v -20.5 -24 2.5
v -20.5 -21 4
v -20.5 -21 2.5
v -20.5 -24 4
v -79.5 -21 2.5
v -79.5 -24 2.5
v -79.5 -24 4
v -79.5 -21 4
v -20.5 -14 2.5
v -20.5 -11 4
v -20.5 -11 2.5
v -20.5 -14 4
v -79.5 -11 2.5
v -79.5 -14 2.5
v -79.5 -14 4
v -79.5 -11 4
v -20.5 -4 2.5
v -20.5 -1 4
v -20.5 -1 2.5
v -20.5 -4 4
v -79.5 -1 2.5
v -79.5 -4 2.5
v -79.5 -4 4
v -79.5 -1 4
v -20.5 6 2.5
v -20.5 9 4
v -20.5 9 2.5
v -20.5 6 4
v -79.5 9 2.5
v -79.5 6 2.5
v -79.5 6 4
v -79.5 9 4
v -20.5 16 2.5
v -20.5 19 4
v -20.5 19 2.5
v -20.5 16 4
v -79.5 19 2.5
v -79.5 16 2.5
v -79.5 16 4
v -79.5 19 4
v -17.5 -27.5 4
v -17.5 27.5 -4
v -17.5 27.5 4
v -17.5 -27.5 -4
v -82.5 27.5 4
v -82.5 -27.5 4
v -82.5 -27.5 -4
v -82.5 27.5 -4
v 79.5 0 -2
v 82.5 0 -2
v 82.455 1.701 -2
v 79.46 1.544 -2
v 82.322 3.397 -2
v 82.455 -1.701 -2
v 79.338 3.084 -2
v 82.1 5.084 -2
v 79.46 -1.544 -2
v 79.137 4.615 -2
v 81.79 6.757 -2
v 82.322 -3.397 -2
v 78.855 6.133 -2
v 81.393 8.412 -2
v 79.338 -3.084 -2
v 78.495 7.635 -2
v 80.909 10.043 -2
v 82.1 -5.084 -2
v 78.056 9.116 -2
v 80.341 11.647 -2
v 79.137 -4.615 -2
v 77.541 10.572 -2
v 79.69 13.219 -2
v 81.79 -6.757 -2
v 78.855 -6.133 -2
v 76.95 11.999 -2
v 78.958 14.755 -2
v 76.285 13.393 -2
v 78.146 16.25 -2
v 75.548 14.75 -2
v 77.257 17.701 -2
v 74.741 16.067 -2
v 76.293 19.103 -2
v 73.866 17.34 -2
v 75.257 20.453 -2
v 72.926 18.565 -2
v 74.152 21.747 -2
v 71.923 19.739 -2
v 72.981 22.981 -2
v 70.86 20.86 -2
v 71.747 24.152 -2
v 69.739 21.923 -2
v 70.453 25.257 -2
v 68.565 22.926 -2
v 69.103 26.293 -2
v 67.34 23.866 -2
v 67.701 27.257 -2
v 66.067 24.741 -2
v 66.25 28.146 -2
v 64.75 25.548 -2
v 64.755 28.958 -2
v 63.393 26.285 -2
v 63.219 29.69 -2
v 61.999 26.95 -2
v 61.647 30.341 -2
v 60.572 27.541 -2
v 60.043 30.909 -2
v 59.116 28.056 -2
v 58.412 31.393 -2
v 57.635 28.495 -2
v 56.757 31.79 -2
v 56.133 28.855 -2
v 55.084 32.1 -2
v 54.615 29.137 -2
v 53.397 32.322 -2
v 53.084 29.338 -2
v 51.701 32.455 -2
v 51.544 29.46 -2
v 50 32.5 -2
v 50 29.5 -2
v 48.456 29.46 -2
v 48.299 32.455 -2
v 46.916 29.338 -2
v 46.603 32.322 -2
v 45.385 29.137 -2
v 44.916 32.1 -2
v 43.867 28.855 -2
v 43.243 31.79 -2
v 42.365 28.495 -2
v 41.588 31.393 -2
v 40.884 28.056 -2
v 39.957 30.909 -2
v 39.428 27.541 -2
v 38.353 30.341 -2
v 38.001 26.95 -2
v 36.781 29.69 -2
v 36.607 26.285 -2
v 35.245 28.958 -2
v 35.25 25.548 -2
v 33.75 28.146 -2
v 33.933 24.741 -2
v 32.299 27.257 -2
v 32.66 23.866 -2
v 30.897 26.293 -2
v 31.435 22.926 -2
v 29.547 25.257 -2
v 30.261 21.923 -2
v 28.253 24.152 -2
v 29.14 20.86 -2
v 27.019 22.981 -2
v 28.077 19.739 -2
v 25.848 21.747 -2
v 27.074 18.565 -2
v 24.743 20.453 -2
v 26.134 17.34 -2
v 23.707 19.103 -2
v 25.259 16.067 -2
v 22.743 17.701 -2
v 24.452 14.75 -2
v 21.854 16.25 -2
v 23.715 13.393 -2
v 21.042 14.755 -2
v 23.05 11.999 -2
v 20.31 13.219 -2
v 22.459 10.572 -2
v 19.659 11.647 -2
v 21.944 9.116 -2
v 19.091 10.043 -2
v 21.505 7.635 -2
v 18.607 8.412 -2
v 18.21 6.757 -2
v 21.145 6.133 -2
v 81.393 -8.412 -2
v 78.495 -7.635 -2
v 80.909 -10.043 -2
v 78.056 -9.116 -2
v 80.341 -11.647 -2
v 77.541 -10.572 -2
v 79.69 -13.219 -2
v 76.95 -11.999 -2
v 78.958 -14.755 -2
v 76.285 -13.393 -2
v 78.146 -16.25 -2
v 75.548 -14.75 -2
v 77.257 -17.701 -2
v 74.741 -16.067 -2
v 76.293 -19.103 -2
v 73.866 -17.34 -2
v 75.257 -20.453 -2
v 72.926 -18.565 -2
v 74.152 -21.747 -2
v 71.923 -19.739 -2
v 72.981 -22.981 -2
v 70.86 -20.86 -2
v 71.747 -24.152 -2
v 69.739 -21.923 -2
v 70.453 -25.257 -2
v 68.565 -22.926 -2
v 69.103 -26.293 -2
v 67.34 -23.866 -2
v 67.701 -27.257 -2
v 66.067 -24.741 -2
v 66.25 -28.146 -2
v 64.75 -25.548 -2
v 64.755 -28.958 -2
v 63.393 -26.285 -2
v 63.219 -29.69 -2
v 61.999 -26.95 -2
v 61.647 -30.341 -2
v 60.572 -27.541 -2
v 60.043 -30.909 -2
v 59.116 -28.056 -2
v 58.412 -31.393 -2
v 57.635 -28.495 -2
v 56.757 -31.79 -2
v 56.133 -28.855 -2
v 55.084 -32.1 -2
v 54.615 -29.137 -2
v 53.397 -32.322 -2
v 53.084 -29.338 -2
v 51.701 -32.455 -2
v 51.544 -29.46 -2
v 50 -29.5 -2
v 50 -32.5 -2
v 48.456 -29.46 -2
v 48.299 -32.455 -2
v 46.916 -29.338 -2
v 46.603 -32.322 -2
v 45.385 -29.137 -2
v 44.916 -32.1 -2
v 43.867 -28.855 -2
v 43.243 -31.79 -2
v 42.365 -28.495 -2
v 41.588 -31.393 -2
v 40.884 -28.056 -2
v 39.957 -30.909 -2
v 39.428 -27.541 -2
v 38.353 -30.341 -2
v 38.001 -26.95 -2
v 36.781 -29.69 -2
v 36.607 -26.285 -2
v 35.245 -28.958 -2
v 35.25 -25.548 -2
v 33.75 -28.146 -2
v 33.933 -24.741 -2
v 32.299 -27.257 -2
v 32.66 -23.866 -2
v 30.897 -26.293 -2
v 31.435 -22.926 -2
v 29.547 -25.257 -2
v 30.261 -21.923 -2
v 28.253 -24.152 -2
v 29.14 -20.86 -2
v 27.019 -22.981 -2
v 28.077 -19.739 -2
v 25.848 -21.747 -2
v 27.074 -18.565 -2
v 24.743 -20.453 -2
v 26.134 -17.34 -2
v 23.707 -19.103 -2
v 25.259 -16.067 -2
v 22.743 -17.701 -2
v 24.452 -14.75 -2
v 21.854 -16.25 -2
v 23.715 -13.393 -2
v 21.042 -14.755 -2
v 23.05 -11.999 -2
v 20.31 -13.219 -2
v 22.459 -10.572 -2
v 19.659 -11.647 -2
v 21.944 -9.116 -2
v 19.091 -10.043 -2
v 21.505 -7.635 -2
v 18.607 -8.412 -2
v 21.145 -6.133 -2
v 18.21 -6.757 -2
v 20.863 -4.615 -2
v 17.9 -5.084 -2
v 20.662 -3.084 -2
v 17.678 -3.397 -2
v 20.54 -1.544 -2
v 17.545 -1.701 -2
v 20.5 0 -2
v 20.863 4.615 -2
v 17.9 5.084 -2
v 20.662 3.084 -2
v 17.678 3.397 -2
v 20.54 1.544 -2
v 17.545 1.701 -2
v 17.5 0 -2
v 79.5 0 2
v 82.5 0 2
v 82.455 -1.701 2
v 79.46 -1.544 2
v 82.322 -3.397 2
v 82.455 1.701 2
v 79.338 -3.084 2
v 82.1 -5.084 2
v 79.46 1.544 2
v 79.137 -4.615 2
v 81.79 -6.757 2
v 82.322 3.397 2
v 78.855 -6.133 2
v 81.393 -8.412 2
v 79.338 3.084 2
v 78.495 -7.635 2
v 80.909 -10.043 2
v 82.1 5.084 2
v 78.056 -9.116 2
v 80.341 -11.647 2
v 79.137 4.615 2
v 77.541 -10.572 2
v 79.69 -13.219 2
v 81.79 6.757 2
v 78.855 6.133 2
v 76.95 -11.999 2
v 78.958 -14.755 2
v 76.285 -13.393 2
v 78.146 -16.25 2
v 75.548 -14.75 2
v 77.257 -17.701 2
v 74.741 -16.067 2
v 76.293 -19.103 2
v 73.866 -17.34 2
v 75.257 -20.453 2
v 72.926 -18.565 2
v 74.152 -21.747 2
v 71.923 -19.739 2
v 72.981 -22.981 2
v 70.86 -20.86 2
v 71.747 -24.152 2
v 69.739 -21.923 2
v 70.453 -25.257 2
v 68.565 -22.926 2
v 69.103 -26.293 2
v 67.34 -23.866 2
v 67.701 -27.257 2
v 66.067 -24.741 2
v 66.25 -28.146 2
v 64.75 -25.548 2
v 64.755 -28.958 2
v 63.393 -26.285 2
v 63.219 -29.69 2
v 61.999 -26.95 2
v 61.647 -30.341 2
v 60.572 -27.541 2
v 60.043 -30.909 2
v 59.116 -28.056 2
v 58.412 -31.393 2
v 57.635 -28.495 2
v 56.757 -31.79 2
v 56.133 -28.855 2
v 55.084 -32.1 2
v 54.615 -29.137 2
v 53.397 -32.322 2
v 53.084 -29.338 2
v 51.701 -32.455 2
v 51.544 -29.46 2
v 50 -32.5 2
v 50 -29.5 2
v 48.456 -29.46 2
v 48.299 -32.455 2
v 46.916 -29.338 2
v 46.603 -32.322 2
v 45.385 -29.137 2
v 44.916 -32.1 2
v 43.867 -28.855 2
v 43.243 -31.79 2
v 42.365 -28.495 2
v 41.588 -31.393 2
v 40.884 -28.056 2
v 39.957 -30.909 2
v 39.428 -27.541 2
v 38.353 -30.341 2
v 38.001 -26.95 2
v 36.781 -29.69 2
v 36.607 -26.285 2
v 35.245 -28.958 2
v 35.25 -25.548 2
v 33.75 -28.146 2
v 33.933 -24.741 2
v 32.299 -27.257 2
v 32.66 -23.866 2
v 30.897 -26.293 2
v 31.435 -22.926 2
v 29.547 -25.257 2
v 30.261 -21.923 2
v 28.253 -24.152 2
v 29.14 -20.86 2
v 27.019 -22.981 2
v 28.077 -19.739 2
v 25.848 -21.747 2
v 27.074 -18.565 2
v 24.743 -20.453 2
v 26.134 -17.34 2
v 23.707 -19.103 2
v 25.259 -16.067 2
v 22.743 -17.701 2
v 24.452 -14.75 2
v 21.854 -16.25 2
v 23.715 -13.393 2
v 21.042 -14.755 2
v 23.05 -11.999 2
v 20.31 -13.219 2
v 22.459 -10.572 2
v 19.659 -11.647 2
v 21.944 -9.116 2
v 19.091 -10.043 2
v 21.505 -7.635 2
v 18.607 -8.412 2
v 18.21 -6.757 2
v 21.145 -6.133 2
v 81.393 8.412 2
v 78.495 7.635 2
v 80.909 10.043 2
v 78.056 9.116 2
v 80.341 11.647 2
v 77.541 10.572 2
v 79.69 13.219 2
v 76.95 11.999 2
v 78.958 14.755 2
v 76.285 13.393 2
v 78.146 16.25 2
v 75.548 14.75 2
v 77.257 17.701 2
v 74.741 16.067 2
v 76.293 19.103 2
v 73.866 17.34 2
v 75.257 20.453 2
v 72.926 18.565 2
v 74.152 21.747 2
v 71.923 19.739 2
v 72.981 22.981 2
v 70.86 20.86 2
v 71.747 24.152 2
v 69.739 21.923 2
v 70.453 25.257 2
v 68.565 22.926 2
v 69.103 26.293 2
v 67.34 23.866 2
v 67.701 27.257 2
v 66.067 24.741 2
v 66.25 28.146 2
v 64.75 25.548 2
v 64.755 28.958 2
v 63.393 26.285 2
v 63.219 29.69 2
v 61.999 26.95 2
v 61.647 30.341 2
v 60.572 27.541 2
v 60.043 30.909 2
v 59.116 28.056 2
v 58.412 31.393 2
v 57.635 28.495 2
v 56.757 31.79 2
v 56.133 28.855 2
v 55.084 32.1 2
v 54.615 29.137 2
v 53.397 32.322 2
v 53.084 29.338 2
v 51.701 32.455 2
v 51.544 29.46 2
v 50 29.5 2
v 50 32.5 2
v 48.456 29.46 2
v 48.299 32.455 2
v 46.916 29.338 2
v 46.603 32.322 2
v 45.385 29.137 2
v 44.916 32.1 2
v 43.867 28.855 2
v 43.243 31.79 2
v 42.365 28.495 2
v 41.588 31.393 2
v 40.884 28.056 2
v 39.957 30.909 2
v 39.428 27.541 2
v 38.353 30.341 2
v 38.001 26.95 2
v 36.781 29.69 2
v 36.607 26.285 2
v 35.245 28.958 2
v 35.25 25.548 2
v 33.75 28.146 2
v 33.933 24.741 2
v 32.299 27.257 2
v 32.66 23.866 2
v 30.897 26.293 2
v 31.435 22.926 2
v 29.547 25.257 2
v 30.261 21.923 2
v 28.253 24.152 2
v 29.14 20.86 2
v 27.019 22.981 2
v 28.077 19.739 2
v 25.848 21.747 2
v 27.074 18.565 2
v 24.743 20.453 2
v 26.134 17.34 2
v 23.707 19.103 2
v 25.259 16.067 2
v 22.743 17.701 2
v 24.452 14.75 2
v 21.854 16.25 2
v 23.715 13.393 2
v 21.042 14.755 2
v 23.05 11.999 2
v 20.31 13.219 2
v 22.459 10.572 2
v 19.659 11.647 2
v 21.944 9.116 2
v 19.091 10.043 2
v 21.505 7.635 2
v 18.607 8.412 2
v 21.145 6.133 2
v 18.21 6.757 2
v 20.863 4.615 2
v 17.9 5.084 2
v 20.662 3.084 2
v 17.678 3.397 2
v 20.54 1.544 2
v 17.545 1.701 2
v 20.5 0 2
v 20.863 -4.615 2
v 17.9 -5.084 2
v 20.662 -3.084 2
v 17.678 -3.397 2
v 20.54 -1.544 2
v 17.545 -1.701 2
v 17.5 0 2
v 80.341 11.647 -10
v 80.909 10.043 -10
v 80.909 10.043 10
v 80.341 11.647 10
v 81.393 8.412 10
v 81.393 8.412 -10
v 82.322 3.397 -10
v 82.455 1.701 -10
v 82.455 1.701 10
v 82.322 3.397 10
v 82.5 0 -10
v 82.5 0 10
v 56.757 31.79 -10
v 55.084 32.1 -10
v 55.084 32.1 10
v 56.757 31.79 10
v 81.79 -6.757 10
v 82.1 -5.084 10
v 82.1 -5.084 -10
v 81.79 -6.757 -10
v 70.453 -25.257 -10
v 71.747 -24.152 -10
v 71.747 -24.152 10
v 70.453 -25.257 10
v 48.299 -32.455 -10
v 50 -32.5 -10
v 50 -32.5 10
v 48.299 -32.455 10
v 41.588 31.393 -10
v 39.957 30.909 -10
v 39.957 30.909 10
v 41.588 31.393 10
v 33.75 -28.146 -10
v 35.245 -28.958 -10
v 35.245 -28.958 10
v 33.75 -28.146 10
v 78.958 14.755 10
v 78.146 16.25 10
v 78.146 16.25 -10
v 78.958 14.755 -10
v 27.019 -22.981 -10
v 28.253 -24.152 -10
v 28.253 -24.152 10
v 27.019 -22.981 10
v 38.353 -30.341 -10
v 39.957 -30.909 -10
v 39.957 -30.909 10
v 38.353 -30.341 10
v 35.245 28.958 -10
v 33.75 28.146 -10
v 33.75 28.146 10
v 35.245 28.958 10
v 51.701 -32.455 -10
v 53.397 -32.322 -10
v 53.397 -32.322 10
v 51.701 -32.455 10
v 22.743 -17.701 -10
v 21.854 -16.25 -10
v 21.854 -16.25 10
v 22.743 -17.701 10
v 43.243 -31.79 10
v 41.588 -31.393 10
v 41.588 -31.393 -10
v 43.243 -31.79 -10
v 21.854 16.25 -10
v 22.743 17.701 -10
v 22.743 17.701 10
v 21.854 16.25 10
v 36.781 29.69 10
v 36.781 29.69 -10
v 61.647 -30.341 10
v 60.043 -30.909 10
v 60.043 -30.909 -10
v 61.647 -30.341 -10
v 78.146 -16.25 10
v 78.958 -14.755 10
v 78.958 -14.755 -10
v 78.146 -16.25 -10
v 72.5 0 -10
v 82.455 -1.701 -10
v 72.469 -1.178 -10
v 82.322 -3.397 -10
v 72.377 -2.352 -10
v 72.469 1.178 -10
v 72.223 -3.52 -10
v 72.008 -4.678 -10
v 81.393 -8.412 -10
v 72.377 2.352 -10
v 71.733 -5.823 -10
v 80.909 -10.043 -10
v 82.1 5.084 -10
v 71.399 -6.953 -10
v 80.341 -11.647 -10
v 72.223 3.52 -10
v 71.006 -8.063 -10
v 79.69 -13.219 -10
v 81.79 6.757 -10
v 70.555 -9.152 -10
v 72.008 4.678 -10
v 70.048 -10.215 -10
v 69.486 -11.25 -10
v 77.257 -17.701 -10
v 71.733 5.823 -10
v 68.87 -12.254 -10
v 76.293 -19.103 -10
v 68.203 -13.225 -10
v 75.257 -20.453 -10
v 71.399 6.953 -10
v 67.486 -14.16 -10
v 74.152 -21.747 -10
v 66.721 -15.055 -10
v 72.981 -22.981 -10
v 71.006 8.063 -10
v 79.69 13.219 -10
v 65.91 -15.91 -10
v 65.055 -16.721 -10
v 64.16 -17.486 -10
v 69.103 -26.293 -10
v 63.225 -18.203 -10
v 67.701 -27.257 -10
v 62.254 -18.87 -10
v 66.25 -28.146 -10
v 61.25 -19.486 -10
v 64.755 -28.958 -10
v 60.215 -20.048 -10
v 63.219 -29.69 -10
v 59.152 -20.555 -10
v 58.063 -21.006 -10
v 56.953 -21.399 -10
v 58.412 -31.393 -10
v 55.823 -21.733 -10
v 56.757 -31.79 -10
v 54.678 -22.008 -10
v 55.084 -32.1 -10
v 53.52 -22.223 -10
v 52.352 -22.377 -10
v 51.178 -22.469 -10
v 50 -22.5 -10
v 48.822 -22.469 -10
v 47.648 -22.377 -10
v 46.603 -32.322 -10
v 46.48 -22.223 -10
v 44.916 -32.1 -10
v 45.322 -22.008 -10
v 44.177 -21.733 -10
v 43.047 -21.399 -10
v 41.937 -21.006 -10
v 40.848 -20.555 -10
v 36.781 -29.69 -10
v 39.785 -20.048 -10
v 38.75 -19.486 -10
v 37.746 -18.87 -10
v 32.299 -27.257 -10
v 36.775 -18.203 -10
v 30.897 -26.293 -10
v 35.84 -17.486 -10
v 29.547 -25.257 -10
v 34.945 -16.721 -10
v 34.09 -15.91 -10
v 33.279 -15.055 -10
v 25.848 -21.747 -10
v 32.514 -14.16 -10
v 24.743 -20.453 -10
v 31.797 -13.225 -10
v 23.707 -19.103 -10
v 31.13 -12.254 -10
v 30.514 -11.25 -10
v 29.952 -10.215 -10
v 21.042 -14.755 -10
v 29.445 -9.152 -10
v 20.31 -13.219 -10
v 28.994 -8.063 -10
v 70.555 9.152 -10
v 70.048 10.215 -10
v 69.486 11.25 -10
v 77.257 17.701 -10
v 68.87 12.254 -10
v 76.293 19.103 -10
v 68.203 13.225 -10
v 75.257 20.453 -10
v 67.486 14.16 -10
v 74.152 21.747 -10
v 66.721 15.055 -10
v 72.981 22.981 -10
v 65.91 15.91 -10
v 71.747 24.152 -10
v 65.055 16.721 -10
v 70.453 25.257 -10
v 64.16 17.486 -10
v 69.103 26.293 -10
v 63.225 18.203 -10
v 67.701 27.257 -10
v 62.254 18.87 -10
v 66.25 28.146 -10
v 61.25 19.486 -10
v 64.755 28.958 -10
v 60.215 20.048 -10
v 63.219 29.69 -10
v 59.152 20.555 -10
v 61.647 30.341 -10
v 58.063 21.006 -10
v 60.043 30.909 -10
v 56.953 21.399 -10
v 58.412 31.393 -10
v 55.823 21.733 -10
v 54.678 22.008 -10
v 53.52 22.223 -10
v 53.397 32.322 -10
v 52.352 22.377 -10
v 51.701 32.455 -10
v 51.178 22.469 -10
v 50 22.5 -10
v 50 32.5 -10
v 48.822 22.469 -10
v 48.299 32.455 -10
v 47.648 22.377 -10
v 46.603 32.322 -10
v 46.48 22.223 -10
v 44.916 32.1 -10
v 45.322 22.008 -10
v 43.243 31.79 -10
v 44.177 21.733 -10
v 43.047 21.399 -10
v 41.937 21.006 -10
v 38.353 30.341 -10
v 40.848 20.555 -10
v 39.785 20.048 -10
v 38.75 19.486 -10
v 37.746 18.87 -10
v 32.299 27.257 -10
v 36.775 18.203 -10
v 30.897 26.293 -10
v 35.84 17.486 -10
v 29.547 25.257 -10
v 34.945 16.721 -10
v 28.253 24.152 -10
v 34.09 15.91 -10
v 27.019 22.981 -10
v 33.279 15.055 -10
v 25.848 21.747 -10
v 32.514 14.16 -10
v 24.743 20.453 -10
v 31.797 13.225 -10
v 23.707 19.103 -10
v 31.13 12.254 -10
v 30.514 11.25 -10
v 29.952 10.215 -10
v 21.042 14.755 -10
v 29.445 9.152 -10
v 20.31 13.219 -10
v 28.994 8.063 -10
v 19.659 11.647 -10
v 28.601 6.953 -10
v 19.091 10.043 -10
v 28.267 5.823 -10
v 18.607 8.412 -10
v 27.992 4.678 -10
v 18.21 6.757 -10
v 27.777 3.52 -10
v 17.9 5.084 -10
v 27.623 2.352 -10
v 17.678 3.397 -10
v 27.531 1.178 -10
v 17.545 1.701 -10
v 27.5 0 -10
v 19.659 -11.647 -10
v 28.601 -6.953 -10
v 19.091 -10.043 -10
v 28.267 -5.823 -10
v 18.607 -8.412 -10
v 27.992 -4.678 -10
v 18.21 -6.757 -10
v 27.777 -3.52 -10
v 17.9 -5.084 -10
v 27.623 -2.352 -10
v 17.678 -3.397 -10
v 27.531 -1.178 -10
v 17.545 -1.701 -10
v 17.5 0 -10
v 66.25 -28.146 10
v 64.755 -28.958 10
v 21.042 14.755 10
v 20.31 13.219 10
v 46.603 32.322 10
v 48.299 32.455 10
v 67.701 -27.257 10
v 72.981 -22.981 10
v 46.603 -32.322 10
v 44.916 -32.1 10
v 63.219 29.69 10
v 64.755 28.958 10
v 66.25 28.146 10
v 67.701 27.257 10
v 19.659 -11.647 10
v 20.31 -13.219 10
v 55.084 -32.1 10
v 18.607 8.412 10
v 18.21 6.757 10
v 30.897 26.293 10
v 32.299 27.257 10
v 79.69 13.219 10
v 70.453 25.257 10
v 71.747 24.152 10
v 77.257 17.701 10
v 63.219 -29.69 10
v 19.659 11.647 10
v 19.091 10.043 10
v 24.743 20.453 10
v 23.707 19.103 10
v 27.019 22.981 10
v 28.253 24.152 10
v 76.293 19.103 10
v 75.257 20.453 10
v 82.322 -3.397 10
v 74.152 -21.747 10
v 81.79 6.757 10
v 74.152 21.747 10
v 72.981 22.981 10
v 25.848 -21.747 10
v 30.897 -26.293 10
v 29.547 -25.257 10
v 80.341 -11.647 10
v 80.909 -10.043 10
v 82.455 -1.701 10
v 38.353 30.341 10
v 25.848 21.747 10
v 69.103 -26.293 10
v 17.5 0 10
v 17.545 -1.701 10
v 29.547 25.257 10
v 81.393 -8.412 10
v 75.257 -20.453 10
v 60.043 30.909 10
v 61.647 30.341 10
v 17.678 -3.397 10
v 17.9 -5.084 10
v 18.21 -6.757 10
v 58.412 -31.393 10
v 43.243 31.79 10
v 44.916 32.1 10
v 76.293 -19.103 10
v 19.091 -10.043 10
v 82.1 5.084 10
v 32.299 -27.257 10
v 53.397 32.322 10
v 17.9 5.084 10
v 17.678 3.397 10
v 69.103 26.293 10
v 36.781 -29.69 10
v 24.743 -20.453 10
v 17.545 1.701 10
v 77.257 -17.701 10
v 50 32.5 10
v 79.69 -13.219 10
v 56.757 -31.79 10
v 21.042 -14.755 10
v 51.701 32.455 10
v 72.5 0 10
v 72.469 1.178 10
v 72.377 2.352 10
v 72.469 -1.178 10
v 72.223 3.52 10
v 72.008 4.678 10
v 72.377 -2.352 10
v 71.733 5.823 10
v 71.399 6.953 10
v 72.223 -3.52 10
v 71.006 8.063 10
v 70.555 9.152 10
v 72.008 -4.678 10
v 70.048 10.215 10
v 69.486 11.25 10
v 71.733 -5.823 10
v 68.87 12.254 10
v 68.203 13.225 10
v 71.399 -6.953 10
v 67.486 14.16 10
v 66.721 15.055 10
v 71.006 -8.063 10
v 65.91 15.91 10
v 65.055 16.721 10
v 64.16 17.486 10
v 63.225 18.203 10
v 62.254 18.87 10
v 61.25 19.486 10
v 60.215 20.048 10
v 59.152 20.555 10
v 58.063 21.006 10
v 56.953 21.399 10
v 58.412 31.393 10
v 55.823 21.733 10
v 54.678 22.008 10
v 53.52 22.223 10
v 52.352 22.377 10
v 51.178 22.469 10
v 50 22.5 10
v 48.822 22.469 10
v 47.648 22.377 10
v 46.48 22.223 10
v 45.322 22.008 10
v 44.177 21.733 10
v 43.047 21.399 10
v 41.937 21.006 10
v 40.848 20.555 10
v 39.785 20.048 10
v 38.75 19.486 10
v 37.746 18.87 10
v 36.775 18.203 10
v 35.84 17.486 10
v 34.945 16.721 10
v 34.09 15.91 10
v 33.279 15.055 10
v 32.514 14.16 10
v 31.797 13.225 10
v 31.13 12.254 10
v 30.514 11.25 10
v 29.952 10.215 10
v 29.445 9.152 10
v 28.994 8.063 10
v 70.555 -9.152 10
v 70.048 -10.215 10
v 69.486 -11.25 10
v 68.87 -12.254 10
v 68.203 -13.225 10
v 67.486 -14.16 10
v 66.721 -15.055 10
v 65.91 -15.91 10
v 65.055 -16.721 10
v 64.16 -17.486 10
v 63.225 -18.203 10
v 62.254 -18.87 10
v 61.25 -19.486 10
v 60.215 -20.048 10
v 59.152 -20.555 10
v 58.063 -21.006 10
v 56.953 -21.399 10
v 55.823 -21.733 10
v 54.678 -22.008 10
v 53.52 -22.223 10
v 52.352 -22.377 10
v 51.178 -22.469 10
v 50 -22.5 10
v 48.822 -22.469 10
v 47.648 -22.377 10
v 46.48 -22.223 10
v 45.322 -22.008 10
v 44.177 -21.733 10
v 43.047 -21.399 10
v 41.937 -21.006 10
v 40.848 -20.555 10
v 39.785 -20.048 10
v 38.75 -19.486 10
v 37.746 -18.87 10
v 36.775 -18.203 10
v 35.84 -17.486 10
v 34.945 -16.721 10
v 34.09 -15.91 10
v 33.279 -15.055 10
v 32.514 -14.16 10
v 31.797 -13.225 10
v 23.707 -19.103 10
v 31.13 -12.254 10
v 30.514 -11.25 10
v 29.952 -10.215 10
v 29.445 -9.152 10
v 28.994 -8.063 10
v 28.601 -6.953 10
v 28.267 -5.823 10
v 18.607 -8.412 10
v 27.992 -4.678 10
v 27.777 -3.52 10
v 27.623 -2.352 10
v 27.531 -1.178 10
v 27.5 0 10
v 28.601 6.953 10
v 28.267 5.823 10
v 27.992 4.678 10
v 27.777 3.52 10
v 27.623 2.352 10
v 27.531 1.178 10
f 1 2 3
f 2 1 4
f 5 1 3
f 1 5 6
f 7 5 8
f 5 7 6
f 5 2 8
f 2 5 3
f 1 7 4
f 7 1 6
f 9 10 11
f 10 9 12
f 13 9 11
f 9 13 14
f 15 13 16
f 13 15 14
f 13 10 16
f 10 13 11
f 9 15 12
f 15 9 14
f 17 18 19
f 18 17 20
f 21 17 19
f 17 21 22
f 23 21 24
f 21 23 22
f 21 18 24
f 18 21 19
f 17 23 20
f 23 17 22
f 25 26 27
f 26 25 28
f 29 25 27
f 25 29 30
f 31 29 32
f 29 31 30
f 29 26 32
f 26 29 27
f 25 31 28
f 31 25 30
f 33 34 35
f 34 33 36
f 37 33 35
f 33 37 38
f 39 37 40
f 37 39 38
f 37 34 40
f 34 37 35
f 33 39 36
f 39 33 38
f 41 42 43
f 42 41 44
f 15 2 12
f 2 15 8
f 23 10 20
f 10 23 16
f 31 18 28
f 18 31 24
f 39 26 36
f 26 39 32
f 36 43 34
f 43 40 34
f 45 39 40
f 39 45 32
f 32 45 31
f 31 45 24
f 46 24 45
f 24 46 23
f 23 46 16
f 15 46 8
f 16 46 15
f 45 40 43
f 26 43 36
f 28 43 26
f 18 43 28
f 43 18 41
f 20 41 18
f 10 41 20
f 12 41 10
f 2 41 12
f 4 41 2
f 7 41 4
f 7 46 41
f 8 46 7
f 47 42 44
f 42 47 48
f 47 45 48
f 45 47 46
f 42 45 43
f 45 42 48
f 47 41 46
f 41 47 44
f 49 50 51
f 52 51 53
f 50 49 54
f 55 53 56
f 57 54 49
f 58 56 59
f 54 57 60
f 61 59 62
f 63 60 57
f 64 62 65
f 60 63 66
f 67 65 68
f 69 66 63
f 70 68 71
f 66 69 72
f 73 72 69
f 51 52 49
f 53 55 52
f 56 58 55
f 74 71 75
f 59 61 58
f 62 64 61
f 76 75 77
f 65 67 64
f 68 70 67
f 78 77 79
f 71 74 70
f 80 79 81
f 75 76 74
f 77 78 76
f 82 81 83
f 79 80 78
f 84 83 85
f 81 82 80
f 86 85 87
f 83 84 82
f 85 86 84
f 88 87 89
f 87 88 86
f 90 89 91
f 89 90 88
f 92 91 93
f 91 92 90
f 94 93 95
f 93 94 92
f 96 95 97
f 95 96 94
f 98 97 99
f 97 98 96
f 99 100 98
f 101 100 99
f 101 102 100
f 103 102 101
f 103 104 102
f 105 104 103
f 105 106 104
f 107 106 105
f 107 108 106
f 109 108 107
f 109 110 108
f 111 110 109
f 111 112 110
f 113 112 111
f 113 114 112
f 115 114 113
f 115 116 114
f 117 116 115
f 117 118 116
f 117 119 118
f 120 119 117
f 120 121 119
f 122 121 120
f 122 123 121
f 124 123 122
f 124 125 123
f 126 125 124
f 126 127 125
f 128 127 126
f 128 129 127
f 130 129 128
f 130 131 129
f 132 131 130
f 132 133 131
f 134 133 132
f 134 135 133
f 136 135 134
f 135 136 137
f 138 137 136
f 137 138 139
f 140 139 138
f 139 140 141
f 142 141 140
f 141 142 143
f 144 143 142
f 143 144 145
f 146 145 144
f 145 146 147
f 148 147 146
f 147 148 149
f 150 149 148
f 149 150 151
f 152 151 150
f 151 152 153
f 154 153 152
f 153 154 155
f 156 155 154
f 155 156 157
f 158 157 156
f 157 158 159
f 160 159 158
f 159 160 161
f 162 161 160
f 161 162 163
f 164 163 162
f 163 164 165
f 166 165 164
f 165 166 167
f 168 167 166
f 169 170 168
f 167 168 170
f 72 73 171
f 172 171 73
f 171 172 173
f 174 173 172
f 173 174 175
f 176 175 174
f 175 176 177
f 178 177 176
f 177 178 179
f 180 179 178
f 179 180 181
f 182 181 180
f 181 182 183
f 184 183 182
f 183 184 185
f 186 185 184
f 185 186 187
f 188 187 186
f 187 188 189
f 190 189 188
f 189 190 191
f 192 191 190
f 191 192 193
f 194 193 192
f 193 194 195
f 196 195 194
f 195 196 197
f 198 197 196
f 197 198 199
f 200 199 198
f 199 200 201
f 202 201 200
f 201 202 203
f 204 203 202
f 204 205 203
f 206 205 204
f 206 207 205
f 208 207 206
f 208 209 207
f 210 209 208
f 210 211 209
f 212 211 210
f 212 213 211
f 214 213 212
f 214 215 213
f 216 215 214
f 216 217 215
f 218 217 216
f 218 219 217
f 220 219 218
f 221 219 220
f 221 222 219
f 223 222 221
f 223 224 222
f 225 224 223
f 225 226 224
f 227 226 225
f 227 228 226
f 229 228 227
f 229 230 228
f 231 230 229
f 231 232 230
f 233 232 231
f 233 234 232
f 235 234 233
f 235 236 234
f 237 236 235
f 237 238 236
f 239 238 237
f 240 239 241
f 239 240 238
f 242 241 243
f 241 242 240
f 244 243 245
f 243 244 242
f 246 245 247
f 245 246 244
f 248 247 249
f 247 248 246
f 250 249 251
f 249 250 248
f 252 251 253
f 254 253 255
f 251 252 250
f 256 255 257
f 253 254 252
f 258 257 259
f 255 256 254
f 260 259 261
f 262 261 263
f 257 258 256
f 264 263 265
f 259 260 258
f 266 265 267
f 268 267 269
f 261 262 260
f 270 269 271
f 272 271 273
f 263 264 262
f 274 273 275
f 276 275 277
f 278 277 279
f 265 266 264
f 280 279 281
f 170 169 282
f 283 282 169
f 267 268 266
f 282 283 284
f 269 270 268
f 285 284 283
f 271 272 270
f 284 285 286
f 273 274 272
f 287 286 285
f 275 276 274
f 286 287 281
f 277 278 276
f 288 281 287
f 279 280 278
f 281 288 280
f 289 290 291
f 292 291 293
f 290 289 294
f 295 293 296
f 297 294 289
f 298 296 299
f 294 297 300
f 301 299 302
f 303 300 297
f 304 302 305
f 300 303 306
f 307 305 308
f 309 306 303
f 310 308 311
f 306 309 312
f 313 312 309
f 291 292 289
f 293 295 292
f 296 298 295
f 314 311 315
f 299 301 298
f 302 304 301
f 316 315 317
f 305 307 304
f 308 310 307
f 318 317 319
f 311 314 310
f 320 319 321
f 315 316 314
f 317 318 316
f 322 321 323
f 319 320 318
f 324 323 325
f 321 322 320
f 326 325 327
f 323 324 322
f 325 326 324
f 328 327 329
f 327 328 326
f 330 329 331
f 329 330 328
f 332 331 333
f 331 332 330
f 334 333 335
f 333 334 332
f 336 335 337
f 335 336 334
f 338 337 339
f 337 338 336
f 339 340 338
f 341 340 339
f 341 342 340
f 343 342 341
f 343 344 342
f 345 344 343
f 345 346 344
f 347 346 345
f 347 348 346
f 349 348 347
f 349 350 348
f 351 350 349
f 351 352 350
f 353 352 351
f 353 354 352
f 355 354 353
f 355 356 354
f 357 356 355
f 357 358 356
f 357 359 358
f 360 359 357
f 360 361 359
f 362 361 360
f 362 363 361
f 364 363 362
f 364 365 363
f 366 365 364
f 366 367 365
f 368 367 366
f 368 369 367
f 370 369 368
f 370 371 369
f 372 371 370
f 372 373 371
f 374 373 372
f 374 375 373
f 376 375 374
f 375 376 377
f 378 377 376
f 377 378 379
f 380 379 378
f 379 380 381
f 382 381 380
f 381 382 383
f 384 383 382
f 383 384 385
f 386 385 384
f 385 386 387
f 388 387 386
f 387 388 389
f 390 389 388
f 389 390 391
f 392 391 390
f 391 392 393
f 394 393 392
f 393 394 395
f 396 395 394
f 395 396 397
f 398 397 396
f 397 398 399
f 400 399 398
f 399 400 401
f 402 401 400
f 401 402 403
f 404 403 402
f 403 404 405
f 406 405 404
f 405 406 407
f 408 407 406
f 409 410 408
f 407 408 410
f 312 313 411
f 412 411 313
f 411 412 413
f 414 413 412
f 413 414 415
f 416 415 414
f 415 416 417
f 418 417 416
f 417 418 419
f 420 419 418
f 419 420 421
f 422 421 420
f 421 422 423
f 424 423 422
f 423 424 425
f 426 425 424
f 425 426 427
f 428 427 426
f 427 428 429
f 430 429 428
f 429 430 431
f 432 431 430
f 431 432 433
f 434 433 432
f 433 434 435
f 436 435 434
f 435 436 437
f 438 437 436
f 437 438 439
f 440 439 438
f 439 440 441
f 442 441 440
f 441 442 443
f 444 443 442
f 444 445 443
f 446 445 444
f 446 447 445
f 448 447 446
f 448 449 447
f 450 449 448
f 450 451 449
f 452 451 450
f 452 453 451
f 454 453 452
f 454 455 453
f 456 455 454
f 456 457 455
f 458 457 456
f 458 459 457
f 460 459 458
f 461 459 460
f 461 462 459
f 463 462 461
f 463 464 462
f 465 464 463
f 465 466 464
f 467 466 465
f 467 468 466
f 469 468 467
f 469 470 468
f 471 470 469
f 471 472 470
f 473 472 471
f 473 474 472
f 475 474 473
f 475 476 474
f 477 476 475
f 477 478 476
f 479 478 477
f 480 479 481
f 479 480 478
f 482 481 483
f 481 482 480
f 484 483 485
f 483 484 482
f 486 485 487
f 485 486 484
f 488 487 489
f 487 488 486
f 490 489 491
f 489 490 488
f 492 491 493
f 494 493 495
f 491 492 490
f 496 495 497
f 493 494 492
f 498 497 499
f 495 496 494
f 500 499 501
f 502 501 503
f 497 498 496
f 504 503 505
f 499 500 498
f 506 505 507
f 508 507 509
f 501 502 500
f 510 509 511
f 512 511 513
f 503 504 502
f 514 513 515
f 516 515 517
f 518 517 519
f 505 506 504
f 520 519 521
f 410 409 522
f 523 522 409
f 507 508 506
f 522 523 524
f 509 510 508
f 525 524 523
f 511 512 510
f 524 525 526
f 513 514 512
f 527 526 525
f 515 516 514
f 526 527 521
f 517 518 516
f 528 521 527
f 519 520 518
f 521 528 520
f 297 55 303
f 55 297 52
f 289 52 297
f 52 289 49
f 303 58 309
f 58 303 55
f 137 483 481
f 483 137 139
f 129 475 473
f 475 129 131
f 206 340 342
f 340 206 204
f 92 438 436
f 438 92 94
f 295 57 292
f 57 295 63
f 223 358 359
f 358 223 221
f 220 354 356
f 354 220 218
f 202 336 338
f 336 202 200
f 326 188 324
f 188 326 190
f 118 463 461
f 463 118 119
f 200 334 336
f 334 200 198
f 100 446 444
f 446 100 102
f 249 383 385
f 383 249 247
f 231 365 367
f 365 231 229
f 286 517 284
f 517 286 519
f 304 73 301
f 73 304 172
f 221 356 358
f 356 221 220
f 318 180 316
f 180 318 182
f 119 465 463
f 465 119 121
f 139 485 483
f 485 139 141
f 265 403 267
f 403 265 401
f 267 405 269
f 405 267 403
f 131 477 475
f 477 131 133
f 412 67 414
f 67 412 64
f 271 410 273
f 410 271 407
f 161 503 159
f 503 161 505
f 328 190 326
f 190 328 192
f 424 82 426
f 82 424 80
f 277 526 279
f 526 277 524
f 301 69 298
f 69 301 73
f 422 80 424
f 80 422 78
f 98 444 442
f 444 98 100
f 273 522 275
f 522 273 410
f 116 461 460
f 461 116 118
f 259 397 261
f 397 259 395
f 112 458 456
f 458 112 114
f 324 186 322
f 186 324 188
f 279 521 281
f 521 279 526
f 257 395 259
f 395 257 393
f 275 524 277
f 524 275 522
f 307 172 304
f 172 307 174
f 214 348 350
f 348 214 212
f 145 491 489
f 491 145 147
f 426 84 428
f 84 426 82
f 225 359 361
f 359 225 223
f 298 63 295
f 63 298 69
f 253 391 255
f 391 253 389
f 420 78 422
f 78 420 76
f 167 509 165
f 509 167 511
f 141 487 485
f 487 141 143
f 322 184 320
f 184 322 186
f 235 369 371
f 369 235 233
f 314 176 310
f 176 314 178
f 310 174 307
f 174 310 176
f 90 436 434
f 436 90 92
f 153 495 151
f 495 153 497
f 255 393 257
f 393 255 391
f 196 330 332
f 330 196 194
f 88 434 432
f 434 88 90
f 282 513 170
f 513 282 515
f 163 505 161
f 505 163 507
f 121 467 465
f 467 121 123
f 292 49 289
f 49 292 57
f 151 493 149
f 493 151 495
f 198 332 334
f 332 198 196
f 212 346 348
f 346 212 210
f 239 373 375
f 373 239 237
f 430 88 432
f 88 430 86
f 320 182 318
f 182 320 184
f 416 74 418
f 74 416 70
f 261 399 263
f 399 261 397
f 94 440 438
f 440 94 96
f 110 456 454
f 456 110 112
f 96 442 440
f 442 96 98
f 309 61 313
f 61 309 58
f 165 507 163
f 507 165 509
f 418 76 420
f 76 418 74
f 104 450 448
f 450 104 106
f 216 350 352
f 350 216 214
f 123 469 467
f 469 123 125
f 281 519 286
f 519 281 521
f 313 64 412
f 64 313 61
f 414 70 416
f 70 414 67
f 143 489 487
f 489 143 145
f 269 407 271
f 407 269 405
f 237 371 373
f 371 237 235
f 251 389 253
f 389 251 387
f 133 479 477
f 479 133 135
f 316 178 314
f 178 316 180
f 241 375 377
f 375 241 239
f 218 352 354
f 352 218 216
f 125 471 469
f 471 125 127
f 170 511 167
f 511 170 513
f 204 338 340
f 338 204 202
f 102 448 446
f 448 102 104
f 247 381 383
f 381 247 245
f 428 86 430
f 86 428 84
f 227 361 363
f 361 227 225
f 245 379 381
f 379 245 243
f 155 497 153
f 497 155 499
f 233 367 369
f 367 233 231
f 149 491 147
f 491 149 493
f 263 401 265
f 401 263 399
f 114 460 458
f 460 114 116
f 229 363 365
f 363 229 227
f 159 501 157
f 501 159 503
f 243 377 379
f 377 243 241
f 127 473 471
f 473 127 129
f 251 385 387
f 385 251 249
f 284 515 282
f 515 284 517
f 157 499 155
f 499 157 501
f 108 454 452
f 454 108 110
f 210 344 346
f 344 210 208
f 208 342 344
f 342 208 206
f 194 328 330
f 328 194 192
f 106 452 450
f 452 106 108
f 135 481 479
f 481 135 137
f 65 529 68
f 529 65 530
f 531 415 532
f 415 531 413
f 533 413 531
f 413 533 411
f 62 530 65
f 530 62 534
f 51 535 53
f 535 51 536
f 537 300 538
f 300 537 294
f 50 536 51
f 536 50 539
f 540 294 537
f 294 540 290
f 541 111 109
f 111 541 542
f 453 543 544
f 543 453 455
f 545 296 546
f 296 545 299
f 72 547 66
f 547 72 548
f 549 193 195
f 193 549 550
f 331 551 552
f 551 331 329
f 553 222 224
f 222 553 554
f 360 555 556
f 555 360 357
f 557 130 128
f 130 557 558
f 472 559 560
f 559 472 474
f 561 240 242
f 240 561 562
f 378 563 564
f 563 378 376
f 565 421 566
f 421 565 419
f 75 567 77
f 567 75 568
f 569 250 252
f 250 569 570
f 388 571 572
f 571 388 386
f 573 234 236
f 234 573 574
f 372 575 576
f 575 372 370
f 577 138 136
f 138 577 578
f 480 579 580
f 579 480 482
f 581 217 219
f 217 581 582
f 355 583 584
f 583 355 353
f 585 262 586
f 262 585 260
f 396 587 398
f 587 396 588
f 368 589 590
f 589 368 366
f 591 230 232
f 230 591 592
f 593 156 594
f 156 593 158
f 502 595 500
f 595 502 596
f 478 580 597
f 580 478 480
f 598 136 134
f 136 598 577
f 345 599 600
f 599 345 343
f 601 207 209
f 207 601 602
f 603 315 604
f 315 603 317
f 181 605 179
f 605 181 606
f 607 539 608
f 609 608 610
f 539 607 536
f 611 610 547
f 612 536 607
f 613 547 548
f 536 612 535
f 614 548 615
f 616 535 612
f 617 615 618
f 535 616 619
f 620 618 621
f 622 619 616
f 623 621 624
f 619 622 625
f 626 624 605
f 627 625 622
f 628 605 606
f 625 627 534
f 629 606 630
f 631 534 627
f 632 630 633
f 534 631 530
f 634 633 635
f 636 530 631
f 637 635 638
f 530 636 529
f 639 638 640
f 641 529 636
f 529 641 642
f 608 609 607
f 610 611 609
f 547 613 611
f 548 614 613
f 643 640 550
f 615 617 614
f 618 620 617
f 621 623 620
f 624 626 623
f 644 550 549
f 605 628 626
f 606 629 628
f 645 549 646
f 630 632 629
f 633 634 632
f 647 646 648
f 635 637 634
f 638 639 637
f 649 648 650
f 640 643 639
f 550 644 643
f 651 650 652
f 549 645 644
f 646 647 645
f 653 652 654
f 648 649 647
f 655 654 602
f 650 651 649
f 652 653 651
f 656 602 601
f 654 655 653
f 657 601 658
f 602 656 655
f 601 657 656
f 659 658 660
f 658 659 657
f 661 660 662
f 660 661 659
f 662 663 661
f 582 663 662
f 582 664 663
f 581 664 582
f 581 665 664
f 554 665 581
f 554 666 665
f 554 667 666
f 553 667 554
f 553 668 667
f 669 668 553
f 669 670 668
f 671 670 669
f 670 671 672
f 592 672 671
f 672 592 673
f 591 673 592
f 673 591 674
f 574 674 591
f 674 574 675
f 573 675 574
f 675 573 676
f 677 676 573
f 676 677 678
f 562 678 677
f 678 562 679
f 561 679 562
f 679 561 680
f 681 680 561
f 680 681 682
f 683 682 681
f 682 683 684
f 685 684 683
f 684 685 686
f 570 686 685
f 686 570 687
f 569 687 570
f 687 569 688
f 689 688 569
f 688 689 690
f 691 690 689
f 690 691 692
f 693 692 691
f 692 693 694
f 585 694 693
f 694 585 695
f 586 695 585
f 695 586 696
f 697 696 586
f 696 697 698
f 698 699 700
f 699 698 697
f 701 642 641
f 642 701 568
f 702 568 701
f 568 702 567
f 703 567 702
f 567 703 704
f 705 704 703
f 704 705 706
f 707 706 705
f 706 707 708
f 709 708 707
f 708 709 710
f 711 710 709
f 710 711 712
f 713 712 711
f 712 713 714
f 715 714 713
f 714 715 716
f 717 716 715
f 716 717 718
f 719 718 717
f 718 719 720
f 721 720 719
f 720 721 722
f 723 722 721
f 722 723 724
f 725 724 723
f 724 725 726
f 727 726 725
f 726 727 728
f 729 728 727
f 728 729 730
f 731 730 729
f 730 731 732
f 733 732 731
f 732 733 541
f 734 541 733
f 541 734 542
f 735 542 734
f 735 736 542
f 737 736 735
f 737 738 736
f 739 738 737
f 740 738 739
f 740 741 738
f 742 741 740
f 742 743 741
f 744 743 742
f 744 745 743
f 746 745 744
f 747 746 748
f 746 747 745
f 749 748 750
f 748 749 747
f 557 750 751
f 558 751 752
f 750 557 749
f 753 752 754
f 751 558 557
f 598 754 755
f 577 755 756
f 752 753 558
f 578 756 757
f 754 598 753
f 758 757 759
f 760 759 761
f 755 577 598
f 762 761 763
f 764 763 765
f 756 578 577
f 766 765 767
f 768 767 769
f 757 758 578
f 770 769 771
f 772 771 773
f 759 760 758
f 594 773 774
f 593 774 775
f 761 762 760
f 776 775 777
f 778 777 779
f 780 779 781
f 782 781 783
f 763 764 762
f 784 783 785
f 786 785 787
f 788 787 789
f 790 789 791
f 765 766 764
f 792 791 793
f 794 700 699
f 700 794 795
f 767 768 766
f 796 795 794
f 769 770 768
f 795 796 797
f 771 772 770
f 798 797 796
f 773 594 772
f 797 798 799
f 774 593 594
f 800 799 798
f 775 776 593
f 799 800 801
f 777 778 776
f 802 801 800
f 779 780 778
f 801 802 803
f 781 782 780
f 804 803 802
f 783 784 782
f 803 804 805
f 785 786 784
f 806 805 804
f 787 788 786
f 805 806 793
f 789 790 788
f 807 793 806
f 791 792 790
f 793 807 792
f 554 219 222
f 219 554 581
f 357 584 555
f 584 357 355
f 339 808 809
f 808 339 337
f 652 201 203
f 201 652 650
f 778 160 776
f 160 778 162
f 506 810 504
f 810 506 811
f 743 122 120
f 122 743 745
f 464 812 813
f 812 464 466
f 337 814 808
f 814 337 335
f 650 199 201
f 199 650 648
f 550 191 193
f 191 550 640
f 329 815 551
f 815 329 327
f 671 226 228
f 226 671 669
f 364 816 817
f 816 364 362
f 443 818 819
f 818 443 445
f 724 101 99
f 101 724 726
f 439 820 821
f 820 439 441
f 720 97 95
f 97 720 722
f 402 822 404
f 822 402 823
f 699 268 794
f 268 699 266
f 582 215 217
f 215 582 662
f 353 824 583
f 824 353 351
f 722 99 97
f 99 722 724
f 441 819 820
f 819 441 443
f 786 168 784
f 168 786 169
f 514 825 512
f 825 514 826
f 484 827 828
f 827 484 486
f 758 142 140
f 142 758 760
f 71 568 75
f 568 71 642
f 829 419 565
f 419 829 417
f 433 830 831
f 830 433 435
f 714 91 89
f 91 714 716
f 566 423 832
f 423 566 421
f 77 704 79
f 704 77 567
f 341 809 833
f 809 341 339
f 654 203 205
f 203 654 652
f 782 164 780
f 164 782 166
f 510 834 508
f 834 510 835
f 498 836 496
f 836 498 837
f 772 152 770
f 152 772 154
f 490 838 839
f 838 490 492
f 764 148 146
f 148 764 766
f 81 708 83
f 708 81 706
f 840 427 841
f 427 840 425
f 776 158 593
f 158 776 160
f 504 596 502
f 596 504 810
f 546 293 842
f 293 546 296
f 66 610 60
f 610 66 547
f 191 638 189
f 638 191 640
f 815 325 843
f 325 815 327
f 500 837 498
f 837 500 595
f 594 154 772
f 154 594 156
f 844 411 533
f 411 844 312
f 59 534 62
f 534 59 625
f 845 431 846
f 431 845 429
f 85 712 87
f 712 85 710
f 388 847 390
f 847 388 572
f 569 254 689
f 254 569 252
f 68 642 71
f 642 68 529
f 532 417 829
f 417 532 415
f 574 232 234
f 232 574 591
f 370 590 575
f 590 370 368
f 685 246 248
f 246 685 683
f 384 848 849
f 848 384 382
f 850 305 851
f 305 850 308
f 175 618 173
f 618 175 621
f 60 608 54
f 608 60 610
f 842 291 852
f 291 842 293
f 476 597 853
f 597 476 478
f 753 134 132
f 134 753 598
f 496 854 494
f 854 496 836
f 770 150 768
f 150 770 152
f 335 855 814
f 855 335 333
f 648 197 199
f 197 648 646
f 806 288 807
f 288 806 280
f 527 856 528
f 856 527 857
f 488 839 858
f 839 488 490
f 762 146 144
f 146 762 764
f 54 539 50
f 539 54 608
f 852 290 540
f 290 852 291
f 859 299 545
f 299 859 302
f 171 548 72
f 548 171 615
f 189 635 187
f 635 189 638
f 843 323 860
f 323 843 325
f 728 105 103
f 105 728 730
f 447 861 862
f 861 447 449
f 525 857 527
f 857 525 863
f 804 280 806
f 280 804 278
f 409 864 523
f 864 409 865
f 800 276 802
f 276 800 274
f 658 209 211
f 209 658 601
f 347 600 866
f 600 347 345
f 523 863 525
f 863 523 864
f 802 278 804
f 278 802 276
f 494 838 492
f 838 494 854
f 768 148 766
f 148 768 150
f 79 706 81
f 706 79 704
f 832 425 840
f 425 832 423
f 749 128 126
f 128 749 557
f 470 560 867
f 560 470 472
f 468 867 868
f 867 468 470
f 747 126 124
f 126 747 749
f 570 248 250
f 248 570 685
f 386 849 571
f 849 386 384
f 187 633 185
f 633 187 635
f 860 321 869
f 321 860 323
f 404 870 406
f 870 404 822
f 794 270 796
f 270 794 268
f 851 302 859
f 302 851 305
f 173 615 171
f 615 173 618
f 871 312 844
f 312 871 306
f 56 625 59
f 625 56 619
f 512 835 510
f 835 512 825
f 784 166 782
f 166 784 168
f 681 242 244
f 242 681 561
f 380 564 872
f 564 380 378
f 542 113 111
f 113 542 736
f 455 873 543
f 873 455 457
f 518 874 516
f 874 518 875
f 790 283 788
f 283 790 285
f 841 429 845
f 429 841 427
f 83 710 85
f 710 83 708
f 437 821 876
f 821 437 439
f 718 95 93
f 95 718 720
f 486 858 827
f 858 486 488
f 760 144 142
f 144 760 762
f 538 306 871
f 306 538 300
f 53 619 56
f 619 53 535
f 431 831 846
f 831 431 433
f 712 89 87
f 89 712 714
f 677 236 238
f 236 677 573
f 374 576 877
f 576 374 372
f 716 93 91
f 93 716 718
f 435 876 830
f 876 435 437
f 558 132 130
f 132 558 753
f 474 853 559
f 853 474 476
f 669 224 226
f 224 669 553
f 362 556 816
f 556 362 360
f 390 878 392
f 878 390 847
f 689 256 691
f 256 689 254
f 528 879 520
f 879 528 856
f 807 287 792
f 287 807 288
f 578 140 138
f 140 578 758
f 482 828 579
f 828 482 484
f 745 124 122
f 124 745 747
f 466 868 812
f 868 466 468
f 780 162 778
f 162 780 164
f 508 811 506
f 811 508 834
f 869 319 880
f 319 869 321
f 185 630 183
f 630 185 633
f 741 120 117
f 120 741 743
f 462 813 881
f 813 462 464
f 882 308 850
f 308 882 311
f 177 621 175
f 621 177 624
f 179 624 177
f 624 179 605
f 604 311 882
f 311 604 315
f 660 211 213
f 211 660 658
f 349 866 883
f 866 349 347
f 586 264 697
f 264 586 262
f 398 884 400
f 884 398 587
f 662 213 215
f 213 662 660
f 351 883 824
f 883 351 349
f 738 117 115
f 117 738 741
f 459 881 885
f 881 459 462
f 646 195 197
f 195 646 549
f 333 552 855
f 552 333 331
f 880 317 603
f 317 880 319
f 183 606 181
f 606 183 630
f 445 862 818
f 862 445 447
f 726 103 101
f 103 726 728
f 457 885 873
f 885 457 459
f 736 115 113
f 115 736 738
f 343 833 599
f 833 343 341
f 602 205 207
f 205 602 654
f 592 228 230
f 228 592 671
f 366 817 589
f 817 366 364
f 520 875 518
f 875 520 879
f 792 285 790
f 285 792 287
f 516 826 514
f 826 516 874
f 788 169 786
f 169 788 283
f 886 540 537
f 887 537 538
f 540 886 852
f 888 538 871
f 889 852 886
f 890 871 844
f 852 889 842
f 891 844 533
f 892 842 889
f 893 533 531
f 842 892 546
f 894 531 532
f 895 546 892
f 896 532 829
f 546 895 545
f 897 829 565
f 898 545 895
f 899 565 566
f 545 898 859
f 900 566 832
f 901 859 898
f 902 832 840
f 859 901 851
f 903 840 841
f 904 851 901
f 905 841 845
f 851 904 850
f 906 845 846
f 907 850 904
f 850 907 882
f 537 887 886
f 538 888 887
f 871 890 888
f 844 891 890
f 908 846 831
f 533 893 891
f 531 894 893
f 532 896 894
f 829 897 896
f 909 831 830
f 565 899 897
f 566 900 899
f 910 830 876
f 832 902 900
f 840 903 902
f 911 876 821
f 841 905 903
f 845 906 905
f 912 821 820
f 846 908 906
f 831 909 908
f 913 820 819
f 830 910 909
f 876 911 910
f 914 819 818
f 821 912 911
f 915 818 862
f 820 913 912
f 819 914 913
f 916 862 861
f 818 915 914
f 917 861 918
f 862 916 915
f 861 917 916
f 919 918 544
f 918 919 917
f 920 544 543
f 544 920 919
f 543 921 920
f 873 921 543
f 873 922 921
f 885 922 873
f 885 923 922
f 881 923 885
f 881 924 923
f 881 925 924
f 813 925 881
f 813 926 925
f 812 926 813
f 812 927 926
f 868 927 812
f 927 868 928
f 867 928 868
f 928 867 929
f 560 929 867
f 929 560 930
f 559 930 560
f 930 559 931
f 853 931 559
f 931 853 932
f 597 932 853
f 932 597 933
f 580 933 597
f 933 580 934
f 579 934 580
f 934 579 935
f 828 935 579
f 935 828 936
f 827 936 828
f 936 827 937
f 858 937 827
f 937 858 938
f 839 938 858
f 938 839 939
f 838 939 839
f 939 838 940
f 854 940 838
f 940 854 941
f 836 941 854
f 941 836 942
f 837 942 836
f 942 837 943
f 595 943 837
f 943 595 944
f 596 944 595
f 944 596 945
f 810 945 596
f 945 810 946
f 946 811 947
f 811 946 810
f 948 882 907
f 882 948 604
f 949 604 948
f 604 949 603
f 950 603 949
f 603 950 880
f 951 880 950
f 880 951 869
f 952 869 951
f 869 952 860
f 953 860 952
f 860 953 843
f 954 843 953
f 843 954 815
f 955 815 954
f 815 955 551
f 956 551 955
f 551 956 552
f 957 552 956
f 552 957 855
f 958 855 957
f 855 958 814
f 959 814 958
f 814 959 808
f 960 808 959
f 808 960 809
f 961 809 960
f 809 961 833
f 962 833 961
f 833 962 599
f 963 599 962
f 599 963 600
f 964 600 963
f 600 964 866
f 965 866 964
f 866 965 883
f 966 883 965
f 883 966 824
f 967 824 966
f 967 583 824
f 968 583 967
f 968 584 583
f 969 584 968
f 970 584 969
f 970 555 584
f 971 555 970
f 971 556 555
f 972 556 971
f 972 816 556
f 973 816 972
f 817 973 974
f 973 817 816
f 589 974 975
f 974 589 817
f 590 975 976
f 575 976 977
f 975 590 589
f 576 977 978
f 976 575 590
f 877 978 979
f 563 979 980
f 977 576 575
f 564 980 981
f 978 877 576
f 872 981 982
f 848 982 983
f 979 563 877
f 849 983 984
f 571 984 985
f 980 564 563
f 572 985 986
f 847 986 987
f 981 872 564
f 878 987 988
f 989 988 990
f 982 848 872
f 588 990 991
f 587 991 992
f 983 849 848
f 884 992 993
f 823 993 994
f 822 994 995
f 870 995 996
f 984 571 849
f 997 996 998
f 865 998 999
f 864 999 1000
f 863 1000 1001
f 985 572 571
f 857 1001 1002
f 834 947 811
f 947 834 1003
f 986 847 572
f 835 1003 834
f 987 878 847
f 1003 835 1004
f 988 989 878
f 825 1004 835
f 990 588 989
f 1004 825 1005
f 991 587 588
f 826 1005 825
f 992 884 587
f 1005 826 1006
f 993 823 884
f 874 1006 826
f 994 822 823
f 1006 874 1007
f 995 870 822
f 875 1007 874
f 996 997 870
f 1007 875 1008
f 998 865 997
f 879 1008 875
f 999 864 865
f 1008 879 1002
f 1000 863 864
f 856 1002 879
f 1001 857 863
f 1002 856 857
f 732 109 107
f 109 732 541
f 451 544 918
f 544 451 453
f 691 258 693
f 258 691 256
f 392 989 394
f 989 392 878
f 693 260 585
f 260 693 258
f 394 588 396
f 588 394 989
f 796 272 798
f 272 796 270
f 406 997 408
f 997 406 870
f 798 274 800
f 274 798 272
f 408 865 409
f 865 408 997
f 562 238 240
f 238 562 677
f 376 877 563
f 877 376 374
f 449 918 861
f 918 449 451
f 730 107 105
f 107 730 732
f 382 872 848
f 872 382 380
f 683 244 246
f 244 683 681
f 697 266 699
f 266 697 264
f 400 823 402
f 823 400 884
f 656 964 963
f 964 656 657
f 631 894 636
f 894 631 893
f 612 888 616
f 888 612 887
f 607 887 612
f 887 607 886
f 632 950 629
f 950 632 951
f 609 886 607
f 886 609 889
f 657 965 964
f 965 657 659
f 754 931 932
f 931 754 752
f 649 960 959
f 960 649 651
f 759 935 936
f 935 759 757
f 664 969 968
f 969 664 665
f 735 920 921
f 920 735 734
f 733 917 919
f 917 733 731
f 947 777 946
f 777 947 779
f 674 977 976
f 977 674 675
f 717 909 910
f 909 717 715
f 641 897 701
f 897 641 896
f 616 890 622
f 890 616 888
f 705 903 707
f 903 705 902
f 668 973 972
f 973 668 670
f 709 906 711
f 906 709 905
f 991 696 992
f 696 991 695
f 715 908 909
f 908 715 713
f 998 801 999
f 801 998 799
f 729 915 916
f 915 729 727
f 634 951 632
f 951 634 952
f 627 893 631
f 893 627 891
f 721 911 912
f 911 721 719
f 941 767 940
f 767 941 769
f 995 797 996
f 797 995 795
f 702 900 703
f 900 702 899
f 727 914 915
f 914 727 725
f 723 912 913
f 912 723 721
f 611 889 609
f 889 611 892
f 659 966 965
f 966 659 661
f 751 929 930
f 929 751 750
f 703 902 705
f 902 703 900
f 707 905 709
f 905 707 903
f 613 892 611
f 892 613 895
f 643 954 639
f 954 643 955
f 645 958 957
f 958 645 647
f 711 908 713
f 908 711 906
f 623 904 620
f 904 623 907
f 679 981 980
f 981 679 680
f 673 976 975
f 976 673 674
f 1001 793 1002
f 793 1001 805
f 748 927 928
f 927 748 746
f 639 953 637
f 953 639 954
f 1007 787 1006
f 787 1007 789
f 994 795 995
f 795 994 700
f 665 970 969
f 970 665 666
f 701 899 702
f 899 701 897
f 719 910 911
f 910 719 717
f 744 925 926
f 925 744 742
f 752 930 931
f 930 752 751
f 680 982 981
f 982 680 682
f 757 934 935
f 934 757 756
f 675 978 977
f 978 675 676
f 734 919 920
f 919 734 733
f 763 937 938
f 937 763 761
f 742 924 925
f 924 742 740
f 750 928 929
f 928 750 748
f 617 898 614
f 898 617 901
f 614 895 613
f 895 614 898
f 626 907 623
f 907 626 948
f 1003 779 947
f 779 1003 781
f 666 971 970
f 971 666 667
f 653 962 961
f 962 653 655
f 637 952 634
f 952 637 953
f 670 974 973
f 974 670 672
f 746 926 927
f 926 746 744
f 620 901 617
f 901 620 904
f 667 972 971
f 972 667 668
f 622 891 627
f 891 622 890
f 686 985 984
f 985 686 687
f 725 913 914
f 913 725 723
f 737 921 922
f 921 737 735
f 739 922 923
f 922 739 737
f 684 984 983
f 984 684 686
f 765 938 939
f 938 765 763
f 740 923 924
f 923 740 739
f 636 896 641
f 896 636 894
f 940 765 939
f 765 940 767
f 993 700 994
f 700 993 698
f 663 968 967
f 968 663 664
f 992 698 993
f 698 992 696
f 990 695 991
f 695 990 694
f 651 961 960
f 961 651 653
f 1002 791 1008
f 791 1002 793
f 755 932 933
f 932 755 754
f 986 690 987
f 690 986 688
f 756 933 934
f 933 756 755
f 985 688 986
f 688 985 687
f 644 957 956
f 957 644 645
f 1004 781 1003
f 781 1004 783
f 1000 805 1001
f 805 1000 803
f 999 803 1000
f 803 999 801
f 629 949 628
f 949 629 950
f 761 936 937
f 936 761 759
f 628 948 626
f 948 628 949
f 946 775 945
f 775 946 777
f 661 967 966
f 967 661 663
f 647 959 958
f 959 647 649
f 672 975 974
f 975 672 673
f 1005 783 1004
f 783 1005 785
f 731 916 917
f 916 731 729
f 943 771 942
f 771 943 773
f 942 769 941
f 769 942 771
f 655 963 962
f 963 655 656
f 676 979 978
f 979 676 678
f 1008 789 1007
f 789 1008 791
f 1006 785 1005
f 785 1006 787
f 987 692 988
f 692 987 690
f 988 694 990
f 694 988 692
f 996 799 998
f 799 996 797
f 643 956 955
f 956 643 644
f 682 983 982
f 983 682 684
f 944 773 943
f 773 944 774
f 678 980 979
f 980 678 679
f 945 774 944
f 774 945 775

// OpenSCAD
// ====================================================================================
// REVOLUTIONARY TECHNOLOGY COMPANY & UNIVERSITY OF WASHINGTON DEPARTMENT OF PHYSICS
// Subsystem: natural_rubber_seals.scad (100% Pure Tree-Harvested Elastomer Profiles)
// Objective: Anti-degradation vibration isolation components for avionics safety
// ====================================================================================

$fn = 120; // Extrusion path rendering clarity

// --- Material Specifications ---
rubber_density_g_cm3 = 0.92; // Constant metric for pure uncured Hevea rubber latex
vulcanized_shre_a   = 65.0; // Hardened track-spec durometer index

// Component Dimension Parameters (mm)
pedal_pad_w       = 65.0;
pedal_pad_h       = 55.0;
grommet_inner_d   = 45.0; // Fits low-voltage Univac data trunks
grommet_outer_d   = 65.0;

module field_harvested_pedal_cover() {
    // Authentic 1969 ribbed clutch/brake pedal grip pad pattern
    color("DarkCharcoal") {
        difference() {
            // Main foot contact pad block
            cube([pedal_pad_w, pedal_pad_h, 8.0], center=true);
            
            // Parametric Anti-Slip Traction Ribs (Molded directly into tree rubber matrix)
            for (y = [-pedal_pad_h/2 + 5 : 10 : pedal_pad_h/2 - 5]) {
                translate([0, y, 3.5])
                    cube([pedal_pad_w - 6, 3.0, 2.0], center=true);
            }
        }
    }
}

module firewall_avionics_grommet() {
    // Weatherproof dual-lip natural rubber sealing ring protecting the wire portals
    color("Black") {
        difference() {
            // Main donut ring shape
            cylinder(d=grommet_outer_d, h=20, center=true);
            // Center clear bore for uncorrupted wire bundle pass-through
            cylinder(d=grommet_inner_d, h=22, center=true);
            
            // Continuous mid-plane mounting slot ring (Sits tight inside the 4mm firewall plate)
            difference() {
                cylinder(d=grommet_outer_d + 2, h=4.0, center=true);
                cylinder(d=grommet_outer_d - 6, h=5.0, center=true);
            }
        }
    }
}

// --- Component Visualization Output ---
translate([-50, 0, 0]) field_harvested_pedal_cover();
translate([50, 0, 0])  firewall_avionics_grommet();
